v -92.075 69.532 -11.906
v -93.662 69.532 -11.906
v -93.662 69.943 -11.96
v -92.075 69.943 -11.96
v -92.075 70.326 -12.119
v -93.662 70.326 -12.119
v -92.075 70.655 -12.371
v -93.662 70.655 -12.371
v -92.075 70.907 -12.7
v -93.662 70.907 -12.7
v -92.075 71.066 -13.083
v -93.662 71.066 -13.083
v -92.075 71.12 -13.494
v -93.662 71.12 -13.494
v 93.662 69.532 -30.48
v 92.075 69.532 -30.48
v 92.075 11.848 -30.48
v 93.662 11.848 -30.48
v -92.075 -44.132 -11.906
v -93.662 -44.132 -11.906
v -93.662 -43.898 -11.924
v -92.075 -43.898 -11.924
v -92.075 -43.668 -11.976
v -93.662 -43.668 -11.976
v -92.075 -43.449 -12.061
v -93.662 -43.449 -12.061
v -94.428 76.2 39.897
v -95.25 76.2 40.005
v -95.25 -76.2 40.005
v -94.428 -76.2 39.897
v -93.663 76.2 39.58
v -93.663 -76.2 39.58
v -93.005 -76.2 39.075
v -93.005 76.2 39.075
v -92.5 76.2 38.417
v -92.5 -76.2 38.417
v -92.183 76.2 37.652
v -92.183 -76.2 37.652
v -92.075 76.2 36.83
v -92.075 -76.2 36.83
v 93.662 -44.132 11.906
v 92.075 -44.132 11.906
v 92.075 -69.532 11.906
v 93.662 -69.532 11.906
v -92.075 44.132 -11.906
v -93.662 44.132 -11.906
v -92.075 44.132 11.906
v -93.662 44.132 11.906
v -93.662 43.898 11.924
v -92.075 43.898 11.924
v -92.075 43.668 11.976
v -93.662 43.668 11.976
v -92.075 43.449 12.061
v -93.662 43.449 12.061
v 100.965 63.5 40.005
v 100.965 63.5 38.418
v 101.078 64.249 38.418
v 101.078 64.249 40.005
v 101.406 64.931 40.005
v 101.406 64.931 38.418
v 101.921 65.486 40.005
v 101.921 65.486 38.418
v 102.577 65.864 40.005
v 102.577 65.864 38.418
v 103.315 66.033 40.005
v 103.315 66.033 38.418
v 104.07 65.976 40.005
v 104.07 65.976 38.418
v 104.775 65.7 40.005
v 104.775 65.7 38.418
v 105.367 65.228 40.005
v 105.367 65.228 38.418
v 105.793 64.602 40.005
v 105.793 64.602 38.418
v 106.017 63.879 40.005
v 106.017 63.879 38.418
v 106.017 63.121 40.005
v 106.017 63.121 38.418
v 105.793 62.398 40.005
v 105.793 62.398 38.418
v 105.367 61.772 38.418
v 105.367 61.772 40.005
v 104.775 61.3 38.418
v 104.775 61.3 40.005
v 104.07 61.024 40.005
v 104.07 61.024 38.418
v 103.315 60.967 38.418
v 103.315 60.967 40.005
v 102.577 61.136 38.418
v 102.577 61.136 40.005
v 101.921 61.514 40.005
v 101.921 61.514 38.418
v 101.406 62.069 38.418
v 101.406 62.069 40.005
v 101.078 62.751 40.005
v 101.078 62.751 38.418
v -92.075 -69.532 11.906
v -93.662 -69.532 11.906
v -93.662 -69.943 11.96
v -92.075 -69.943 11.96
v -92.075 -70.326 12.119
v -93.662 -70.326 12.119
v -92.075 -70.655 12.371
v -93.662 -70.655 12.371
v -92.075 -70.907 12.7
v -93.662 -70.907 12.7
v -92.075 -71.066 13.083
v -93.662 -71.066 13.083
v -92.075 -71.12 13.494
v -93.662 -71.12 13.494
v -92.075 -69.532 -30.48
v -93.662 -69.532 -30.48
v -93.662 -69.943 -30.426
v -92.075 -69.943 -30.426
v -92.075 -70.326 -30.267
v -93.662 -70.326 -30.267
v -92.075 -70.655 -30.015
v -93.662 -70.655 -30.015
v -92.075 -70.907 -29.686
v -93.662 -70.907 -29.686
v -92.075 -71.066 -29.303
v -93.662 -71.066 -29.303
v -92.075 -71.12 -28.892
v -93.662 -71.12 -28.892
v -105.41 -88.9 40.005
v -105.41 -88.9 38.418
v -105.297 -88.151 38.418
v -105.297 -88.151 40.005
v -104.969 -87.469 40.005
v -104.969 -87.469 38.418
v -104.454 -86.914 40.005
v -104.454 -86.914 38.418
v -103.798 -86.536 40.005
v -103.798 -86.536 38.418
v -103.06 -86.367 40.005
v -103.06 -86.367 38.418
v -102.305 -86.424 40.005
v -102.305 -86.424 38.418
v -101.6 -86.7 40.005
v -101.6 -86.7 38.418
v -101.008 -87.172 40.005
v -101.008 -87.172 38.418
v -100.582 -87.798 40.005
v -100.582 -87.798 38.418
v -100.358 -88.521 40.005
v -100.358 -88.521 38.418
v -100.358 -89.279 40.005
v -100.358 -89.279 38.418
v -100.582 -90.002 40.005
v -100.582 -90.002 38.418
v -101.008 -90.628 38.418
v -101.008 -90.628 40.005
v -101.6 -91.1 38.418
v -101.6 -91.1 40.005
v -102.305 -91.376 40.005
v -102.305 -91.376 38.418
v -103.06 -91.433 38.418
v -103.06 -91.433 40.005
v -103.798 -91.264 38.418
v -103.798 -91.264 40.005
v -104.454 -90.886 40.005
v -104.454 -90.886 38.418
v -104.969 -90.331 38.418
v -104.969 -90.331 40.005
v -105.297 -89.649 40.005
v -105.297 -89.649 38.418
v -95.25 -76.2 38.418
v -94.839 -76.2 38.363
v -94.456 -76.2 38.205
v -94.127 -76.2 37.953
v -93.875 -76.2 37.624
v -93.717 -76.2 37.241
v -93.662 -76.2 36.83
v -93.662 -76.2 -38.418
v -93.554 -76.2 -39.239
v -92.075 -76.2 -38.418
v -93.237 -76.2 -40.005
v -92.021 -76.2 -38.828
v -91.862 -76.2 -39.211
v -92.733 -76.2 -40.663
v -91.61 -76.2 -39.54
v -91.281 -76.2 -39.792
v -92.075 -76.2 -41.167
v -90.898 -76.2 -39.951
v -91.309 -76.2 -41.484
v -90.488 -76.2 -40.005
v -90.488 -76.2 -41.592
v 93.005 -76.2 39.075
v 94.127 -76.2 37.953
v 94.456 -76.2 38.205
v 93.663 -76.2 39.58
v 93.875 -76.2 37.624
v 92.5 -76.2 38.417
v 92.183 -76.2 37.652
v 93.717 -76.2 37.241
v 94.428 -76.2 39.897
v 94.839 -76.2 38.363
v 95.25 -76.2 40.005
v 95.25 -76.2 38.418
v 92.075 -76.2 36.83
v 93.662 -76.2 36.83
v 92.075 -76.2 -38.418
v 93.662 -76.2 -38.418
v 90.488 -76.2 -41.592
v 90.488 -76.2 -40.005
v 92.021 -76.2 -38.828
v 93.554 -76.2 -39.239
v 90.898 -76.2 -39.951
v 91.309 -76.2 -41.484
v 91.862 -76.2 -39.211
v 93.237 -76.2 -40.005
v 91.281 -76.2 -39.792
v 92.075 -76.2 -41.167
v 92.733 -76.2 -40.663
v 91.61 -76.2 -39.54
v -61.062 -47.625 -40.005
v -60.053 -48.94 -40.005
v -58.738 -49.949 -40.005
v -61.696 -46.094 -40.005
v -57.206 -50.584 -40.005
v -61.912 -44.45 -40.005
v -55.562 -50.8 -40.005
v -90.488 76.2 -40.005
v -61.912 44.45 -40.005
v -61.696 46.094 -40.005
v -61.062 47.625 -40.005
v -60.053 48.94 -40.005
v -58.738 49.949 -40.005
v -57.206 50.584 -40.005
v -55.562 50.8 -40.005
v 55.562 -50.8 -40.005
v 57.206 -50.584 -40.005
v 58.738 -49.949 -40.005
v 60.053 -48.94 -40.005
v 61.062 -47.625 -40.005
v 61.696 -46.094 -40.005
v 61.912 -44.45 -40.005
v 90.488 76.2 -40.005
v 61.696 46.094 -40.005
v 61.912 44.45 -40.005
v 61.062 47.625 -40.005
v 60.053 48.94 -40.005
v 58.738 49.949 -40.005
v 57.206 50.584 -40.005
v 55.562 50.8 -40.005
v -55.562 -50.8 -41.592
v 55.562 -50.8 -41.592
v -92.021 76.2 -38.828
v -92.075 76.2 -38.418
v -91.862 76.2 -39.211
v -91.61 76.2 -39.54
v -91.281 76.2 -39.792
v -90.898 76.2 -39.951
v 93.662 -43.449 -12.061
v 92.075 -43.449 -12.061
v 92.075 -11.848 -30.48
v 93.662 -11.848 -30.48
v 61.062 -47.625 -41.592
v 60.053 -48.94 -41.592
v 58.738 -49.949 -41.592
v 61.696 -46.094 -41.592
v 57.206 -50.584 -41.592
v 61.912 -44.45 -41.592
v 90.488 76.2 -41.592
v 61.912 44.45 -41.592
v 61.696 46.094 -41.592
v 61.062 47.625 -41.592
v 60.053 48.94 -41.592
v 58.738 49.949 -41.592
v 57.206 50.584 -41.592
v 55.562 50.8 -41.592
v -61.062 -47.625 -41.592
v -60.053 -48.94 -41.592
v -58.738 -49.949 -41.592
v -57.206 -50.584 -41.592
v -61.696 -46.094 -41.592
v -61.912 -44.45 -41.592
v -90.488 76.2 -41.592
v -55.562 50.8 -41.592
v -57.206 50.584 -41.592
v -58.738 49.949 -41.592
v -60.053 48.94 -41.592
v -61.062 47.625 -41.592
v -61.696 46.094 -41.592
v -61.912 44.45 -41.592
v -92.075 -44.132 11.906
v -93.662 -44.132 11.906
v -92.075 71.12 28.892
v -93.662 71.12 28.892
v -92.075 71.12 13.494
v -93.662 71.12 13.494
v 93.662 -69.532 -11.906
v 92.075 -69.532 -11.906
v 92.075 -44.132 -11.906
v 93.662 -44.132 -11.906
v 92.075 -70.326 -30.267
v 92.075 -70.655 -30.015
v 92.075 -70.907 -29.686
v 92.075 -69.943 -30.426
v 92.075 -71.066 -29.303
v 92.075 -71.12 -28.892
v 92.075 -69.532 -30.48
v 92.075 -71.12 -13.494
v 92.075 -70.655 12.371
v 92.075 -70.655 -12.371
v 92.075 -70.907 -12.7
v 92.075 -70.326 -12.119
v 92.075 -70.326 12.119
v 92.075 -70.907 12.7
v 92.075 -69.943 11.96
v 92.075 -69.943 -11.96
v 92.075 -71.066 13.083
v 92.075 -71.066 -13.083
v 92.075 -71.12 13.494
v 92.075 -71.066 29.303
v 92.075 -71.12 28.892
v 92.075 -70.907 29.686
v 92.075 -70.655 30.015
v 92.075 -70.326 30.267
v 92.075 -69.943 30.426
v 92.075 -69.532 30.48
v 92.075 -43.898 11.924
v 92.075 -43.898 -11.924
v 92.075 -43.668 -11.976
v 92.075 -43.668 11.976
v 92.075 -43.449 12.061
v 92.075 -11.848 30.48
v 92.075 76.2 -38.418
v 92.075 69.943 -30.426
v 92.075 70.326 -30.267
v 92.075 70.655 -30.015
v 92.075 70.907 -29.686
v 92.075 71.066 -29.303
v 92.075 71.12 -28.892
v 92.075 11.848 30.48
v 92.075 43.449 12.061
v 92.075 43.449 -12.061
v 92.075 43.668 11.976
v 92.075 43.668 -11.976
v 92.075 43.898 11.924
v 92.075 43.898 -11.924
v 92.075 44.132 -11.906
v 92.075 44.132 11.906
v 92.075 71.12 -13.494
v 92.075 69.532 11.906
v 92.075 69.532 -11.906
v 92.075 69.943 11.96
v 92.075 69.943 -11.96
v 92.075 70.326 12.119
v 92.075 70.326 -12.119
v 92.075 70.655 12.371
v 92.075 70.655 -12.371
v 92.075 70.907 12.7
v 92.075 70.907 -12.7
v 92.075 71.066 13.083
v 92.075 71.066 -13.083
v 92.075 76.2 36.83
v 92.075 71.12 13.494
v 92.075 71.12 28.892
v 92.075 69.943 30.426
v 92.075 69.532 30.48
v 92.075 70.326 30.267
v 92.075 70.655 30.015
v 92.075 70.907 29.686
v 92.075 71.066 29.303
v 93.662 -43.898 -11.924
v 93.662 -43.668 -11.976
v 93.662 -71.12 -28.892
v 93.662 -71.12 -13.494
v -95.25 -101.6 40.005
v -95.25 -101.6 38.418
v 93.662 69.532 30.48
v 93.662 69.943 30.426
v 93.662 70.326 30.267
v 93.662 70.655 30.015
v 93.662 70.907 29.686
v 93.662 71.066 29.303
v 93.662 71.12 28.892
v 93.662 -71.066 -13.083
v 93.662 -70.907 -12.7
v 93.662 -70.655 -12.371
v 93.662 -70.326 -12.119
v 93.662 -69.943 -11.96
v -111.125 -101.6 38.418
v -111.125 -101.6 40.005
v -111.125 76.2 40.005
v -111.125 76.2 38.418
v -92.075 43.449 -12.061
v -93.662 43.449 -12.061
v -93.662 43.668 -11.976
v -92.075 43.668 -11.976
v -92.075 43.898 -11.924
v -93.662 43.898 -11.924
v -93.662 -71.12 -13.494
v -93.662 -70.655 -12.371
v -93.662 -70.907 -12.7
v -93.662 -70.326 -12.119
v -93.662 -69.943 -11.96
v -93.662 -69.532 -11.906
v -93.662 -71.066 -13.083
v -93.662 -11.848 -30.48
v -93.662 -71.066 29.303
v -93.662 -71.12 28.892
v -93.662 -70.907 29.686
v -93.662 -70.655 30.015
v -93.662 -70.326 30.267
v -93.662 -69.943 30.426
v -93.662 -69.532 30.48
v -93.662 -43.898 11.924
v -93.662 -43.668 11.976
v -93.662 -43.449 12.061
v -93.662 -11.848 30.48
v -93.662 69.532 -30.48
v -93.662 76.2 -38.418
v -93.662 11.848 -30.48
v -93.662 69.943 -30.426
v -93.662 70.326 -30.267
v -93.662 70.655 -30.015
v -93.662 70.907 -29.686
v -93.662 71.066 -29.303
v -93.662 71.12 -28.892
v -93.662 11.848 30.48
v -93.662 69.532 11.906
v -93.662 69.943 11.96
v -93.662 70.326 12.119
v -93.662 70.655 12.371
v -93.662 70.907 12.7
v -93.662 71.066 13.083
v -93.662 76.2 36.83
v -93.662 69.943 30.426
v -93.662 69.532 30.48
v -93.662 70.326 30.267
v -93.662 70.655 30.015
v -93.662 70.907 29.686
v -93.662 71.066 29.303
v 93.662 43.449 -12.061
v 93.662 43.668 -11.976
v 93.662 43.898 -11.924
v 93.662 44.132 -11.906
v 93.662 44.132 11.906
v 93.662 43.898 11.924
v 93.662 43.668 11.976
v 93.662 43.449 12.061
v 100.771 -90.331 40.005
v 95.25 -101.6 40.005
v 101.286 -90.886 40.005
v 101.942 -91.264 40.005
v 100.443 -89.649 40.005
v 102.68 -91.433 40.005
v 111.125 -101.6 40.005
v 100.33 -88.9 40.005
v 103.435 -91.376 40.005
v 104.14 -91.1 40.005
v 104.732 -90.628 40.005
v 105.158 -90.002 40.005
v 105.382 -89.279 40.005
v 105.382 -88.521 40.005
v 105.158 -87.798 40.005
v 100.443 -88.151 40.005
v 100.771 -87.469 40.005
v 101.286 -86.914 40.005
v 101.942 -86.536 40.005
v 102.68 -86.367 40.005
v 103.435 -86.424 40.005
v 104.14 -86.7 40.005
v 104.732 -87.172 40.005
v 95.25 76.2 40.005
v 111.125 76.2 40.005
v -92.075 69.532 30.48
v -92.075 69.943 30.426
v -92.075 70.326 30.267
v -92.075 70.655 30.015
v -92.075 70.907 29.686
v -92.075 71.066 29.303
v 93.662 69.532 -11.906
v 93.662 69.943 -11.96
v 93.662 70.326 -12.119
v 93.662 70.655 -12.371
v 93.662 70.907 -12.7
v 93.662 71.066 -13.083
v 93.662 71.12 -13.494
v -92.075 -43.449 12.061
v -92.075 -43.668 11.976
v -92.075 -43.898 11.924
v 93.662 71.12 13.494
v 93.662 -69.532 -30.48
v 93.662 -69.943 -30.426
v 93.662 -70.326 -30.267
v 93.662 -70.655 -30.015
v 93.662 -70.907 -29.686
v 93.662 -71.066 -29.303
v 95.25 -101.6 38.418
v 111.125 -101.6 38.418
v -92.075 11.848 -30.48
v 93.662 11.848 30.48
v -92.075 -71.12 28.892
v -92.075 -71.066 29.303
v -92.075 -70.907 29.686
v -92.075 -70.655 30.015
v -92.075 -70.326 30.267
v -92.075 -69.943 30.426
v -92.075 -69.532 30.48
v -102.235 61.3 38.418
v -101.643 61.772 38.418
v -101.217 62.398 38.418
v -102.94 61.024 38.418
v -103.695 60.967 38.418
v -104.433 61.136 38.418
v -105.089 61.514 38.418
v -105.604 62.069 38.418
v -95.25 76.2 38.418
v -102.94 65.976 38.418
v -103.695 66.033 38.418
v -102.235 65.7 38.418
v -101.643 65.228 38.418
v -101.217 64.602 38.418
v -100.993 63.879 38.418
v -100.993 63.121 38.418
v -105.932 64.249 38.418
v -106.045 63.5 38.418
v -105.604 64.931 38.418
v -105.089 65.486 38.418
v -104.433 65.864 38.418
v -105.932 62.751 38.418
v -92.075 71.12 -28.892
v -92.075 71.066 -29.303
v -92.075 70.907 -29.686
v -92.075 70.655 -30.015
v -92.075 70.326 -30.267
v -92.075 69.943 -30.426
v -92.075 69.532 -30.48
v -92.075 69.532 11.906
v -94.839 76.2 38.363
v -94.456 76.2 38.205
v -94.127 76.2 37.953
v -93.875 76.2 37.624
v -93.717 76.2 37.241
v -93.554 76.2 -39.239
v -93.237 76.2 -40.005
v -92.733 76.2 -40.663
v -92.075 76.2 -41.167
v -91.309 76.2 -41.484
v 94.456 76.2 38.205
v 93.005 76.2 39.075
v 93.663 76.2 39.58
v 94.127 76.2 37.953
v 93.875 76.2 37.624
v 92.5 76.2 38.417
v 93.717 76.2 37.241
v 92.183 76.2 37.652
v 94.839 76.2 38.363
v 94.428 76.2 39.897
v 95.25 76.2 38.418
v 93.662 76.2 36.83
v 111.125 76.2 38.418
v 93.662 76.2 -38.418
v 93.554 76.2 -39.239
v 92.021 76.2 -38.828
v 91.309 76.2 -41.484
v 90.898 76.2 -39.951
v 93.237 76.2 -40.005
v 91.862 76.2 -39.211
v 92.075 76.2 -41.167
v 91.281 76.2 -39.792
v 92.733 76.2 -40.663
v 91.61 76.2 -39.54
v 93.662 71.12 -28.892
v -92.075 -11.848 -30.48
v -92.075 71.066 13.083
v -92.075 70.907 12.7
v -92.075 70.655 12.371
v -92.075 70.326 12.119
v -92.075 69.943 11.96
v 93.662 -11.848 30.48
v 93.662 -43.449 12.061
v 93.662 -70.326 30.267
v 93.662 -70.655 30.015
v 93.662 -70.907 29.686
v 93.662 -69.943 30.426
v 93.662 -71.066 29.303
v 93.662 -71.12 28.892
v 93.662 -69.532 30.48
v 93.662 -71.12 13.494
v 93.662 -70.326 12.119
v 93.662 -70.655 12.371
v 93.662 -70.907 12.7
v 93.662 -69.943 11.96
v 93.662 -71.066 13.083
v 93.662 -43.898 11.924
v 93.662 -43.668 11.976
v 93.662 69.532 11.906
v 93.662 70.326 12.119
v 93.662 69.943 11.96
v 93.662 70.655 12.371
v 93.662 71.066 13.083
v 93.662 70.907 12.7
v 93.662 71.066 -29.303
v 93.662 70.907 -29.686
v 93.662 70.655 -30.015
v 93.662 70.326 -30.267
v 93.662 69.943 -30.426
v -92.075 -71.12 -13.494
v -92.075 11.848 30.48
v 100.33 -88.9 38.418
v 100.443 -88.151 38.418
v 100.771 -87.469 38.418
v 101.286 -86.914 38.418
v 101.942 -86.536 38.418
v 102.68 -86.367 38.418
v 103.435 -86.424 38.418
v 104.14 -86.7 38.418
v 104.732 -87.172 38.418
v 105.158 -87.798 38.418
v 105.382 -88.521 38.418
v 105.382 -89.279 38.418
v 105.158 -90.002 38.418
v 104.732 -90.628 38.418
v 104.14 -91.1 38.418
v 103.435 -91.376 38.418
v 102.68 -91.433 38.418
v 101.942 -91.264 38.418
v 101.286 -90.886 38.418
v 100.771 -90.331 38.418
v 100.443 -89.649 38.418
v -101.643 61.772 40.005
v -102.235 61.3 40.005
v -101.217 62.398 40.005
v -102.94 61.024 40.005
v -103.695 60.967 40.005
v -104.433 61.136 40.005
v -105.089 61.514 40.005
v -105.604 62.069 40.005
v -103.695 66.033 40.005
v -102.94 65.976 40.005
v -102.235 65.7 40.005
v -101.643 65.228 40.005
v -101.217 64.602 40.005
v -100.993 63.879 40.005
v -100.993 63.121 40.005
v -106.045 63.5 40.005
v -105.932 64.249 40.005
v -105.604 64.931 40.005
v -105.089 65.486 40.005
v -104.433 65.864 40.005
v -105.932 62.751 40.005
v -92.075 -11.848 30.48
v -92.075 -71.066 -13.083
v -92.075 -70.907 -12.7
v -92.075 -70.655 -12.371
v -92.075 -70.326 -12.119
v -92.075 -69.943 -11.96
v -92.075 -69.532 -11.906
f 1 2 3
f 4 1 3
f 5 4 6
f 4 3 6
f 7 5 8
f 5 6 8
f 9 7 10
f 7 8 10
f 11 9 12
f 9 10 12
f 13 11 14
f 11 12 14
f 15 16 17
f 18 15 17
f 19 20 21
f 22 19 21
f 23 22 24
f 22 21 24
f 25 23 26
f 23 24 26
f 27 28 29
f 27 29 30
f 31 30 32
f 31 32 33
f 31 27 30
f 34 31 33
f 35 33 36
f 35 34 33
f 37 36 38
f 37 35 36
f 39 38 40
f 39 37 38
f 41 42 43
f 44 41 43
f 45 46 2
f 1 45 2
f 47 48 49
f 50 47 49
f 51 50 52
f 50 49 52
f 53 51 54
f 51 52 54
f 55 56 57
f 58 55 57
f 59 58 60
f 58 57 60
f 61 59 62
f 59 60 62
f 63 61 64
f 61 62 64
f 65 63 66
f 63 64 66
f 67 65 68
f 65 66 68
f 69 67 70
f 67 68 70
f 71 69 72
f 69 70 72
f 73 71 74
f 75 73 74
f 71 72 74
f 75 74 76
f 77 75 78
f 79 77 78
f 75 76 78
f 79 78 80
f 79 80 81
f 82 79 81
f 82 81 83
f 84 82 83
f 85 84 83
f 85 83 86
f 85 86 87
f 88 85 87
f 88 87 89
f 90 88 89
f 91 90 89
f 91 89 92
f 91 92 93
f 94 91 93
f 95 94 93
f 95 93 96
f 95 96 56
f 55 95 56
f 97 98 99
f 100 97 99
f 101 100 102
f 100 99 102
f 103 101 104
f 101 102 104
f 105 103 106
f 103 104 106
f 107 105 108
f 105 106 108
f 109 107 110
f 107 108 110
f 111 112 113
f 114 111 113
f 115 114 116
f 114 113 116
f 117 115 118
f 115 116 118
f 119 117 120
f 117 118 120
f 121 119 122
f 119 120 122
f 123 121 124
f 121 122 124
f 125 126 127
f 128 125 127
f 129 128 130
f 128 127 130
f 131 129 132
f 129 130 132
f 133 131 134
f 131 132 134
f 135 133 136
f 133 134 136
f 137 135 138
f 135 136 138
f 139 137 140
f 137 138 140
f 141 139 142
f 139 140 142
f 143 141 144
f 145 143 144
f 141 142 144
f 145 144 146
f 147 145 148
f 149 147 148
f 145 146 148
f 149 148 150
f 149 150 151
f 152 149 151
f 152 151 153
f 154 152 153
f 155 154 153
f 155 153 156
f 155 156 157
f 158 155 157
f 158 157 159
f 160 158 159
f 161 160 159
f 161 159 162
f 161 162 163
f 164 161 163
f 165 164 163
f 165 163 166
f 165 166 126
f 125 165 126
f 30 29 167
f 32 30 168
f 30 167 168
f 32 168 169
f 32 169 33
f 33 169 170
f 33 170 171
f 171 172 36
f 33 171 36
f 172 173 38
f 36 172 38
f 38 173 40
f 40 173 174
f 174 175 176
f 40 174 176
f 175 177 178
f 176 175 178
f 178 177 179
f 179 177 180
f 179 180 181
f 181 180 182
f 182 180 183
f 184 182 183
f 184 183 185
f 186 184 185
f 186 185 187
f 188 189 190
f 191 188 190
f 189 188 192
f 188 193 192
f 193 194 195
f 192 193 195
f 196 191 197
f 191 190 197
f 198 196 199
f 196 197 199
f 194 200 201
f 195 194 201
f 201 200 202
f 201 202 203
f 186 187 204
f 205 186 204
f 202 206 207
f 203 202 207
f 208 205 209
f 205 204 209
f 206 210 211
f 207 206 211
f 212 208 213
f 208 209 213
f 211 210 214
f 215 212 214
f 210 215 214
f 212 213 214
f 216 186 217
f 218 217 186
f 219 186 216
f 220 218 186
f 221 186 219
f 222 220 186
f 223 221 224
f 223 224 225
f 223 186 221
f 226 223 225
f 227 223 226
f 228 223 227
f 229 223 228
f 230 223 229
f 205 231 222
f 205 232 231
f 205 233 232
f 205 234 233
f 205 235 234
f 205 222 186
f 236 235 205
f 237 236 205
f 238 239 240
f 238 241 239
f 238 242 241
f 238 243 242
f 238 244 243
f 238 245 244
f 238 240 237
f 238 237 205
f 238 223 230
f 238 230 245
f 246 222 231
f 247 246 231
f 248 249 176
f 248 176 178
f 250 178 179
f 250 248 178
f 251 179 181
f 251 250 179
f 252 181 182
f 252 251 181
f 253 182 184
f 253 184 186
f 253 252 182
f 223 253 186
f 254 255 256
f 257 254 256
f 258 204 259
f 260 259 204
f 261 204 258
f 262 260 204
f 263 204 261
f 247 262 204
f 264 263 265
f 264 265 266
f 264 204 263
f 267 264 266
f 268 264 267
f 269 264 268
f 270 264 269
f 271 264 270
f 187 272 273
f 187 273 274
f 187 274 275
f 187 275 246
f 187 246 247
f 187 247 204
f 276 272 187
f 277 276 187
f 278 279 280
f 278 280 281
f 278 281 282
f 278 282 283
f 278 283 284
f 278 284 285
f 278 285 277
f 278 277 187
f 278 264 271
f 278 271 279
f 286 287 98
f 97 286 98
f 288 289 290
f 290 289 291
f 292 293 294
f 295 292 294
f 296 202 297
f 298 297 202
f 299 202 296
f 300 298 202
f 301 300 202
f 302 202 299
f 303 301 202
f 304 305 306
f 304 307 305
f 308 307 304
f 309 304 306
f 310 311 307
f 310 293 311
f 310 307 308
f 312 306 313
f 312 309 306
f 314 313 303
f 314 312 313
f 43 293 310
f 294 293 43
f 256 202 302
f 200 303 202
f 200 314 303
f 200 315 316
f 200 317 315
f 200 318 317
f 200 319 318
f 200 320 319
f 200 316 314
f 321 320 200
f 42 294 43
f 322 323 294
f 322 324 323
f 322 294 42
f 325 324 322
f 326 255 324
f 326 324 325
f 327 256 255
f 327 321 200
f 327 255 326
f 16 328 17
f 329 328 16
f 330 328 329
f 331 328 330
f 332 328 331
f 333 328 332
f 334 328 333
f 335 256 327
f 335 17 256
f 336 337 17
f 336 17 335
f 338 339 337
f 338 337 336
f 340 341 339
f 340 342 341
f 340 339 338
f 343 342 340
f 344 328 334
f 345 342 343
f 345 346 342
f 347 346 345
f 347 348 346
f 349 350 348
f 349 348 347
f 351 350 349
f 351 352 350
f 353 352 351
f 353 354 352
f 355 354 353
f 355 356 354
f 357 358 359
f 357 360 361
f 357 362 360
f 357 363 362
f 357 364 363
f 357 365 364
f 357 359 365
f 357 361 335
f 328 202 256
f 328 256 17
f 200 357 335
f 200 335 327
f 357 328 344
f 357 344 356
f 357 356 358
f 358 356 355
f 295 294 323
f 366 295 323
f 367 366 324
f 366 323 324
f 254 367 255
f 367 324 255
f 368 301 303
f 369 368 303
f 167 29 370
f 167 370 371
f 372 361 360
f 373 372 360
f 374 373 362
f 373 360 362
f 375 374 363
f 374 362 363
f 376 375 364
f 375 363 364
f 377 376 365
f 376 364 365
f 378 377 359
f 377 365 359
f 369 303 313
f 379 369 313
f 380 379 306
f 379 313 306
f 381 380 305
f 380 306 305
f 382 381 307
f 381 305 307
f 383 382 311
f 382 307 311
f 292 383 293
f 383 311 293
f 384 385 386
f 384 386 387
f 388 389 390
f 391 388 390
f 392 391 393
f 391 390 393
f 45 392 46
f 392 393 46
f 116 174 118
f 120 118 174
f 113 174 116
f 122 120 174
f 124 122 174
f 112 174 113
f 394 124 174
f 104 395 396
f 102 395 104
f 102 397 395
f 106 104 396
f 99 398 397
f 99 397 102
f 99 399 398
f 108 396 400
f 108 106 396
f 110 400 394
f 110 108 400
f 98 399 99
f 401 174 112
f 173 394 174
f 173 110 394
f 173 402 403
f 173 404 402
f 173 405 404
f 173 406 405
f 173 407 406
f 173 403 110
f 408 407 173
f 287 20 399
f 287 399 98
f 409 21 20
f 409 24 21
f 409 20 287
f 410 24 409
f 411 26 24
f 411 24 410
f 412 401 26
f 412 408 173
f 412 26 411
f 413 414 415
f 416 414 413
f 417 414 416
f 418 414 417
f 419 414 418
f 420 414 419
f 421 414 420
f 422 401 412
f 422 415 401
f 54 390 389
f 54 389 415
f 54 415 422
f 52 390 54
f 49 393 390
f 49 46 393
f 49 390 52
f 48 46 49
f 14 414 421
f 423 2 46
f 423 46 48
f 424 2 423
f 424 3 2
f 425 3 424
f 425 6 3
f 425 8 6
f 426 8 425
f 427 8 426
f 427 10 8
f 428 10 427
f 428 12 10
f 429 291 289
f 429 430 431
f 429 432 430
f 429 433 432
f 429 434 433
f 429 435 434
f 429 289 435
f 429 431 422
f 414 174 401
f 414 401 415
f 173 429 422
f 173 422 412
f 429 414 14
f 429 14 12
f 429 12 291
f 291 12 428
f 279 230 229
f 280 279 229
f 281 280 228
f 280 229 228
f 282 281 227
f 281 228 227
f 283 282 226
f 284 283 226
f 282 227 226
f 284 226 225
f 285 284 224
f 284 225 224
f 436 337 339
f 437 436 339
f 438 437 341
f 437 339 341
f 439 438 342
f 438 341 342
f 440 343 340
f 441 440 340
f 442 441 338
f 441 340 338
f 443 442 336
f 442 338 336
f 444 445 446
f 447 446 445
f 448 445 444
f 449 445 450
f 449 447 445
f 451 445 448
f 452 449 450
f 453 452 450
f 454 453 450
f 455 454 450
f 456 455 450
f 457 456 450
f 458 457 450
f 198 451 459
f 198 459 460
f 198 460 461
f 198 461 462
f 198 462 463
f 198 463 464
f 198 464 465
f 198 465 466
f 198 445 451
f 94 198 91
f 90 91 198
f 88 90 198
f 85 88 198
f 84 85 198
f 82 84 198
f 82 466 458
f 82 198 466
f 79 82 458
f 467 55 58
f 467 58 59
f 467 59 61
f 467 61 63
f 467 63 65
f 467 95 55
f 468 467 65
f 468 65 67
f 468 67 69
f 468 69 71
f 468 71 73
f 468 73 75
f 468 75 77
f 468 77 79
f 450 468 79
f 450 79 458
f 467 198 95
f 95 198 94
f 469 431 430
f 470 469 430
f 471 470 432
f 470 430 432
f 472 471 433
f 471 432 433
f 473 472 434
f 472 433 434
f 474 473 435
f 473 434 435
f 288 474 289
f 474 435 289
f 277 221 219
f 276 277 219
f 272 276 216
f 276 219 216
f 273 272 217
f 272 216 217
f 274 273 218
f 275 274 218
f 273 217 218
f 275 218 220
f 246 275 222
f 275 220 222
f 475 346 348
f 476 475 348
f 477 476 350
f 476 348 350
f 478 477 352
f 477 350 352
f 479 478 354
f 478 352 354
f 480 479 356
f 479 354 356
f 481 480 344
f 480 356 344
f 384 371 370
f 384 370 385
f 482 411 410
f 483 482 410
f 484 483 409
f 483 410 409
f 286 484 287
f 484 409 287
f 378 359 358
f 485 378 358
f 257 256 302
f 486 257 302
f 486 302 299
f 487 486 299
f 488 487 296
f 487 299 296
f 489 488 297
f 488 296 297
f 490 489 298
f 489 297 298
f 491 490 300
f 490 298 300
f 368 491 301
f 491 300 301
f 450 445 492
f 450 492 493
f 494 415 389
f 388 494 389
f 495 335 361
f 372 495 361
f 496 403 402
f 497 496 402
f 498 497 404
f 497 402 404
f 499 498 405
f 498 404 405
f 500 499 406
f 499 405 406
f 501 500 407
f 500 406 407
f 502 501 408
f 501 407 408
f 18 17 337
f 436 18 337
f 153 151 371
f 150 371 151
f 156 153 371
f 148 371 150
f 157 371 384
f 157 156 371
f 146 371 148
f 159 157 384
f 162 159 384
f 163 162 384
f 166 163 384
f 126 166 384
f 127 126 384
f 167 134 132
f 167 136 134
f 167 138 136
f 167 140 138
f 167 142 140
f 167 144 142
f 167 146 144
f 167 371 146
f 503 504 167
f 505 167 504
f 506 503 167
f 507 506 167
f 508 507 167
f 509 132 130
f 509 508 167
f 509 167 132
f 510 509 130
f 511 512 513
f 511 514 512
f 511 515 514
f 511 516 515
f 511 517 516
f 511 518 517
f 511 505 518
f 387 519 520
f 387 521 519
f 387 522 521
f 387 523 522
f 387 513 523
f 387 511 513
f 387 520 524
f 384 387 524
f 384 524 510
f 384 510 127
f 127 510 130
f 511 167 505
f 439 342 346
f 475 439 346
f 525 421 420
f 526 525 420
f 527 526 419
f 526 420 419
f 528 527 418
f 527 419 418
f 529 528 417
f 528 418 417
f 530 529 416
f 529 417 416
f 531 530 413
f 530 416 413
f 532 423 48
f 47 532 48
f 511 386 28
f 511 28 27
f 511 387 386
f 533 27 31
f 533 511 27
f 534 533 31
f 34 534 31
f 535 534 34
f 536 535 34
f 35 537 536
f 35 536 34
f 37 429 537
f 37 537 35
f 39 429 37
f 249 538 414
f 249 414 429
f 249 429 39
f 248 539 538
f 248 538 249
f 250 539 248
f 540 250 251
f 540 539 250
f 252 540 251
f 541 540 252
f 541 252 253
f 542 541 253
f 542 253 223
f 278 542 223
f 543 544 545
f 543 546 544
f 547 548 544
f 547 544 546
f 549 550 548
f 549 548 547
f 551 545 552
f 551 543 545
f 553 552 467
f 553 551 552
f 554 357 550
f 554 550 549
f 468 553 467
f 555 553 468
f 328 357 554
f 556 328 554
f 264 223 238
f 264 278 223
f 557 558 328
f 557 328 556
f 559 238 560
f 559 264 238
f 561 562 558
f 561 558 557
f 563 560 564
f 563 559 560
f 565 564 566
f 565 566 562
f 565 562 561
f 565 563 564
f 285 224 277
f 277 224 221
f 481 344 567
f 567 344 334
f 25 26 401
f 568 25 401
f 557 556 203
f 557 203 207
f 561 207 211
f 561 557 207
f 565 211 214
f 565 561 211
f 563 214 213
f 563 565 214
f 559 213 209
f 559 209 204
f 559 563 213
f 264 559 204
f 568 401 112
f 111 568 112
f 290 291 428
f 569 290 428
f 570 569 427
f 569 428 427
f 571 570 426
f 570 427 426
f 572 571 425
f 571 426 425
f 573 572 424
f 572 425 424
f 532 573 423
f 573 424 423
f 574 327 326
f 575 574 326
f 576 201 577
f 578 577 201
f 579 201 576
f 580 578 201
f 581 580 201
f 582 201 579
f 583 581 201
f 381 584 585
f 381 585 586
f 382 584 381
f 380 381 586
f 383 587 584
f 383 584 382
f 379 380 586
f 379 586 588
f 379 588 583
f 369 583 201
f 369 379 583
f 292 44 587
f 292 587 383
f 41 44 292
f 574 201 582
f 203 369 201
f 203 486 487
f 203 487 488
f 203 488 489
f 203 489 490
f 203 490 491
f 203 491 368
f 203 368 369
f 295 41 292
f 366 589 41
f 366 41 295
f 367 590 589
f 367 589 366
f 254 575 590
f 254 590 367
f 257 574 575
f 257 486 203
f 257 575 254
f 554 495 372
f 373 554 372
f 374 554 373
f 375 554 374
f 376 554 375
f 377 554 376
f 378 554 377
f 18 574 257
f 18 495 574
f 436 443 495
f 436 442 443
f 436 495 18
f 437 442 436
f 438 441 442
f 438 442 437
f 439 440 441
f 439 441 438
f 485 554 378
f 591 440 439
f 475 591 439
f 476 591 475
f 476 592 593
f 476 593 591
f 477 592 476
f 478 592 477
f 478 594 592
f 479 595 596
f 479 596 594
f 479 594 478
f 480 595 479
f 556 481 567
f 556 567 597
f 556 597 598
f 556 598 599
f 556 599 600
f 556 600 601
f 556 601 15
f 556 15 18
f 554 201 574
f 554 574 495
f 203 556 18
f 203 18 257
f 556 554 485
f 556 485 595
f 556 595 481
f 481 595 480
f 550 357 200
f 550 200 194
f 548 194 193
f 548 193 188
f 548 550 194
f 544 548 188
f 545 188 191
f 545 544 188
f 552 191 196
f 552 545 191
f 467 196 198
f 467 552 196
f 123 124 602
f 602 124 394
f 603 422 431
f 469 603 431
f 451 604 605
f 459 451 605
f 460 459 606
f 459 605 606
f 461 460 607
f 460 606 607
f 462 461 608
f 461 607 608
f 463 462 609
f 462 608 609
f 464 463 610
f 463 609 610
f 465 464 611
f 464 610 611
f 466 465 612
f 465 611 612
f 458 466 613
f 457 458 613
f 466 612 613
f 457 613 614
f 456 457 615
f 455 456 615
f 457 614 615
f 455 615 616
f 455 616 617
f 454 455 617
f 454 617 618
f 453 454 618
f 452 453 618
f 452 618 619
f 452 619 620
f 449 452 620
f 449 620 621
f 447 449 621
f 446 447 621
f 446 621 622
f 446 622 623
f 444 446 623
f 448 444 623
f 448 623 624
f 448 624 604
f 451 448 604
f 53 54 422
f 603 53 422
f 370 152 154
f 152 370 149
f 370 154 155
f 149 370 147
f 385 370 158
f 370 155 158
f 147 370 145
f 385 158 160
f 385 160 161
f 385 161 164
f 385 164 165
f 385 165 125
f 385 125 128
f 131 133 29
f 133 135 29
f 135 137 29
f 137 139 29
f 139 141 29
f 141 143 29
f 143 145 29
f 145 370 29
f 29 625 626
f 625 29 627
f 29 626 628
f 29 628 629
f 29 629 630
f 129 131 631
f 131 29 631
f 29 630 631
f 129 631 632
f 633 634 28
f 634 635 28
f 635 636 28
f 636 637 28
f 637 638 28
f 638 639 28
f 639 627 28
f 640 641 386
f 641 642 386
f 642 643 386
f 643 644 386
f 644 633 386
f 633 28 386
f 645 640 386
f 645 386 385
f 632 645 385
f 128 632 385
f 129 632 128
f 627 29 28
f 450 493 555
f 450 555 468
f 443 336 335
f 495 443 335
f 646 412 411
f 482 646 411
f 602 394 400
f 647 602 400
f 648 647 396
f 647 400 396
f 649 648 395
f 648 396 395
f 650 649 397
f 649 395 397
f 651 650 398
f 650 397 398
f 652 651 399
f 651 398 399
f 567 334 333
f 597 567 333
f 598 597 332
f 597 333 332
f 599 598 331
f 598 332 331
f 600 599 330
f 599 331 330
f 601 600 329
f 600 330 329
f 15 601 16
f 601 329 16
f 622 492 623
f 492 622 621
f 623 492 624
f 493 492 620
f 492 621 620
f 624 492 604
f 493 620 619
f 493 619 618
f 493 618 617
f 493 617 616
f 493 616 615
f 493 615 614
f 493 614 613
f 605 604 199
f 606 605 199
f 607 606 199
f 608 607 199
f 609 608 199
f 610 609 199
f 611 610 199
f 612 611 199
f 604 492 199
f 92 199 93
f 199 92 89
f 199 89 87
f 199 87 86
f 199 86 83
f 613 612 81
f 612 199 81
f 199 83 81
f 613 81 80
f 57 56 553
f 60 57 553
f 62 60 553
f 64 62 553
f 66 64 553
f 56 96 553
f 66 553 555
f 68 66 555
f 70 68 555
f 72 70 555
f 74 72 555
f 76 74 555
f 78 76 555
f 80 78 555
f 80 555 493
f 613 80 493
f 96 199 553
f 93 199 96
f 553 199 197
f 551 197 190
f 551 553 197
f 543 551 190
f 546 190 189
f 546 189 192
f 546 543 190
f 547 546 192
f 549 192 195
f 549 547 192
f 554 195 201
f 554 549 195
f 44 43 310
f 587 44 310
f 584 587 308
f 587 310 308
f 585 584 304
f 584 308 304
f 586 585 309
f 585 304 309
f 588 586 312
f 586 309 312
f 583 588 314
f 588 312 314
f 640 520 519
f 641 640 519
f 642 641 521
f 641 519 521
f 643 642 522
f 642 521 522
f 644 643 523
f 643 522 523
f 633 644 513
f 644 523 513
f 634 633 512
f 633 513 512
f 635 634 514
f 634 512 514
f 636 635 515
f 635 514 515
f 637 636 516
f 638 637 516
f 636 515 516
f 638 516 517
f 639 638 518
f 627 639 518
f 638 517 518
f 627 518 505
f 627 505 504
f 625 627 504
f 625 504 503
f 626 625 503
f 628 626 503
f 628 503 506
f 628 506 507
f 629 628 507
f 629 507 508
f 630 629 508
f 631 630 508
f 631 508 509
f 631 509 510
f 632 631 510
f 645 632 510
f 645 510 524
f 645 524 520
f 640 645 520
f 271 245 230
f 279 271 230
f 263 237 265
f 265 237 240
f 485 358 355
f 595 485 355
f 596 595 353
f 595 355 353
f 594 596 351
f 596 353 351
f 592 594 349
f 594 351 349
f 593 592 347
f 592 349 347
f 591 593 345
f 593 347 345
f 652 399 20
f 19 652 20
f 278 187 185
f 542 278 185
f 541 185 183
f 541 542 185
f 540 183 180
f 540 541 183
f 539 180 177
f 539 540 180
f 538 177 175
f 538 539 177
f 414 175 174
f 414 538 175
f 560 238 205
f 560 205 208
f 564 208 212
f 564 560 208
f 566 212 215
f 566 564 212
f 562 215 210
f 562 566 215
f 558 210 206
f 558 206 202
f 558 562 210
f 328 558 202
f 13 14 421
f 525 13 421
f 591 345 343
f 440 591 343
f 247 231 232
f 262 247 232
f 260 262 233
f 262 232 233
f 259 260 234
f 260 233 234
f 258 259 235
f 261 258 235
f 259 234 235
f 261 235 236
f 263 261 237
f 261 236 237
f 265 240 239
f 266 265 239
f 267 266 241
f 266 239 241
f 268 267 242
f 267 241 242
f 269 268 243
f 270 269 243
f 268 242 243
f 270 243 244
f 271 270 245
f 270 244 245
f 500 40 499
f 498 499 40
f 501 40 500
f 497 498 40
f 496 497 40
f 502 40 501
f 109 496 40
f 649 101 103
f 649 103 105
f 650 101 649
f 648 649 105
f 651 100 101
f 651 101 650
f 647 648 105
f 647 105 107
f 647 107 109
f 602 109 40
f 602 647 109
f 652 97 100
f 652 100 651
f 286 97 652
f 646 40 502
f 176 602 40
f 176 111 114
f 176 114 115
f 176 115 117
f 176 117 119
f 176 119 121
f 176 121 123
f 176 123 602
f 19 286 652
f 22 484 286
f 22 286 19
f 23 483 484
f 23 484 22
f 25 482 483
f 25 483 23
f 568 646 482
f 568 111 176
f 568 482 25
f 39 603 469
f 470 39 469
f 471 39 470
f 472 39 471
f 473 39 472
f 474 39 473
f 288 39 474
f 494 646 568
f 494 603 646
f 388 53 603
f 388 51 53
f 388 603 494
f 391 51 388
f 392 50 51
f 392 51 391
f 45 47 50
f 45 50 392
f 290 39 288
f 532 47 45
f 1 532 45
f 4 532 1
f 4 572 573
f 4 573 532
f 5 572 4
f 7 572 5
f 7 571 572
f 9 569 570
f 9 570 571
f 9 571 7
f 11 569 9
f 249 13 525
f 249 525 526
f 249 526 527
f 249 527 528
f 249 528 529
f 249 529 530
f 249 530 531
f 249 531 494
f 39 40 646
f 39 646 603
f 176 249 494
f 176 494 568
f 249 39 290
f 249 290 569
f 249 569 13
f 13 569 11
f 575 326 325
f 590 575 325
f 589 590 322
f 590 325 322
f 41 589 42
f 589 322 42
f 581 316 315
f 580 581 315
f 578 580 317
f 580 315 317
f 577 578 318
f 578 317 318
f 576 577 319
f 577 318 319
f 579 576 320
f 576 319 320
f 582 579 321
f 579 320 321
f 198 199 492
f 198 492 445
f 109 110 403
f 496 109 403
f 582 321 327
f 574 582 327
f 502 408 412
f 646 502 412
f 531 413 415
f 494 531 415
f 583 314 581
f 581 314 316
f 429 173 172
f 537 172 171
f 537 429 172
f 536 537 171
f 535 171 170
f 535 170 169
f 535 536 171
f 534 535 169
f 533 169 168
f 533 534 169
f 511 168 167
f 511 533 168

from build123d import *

# Parameters (mm, degrees)
BASE_FLANGE1_DEPTH  = 76.2
CUT_EXTRUDE1_DEPTH  = 1.5875
CUT_EXTRUDE4_DEPTH  = 223.428182145
SKETCH11_W          = 15.875
SKETCH11_H          = 1.5875
BOSS_EXTRUDE1_DEPTH = 25.4
SKETCH12_W          = 15.875
SKETCH12_H          = 1.5875
BOSS_EXTRUDE2_DEPTH = 25.4
SKETCH13_R          = 2.54
CUT_EXTRUDE5_DEPTH  = 25.4
SKETCH14_R          = 2.54
CUT_EXTRUDE6_DEPTH  = 25.4
SKETCH15_R          = 2.54
CUT_EXTRUDE7_DEPTH  = 25.4


# Sheet-metal steps are written as plain solids
with BuildPart() as part:
    # Sketch1 → Base-Flange1 (new, symmetric)
    with BuildSketch(Plane(origin=(0, 0, 0), x_dir=(1, 0, 0), z_dir=(0, 1, 0))):
        with BuildLine():
            Line((-111.125, -40.005), (-95.25, -40.005))
            ThreePointArc((-95.25, -40.005), (-93.00493597, -39.07506403), (-92.075, -36.83))
            Line((-92.075, -36.83), (-92.075, 38.4175))
            ThreePointArc((-92.075, 38.4175), (-91.610032015, 39.540032015), (-90.4875, 40.005))
            Line((-90.4875, 40.005), (90.4875, 40.005))
            ThreePointArc((90.4875, 40.005), (91.610032015, 39.540032015), (92.075, 38.4175))
            Line((92.075, 38.4175), (92.075, -36.83))
            ThreePointArc((92.075, -36.83), (93.00493597, -39.07506403), (95.25, -40.005))
            Line((95.25, -40.005), (111.125, -40.005))
            Line((111.125, -40.005), (111.125, -38.4175))
            Line((111.125, -38.4175), (95.25, -38.4175))
            ThreePointArc((95.25, -38.4175), (94.127467985, -37.952532015), (93.6625, -36.83))
            Line((93.6625, -36.83), (93.6625, 38.4175))
            ThreePointArc((93.6625, 38.4175), (92.73256403, 40.66256403), (90.4875, 41.5925))
            Line((90.4875, 41.5925), (-90.4875, 41.5925))
            ThreePointArc((-90.4875, 41.5925), (-92.73256403, 40.66256403), (-93.6625, 38.4175))
            Line((-93.6625, 38.4175), (-93.6625, -36.83))
            ThreePointArc((-93.6625, -36.83), (-94.127467985, -37.952532015), (-95.25, -38.4175))
            Line((-95.25, -38.4175), (-111.125, -38.4175))
            Line((-111.125, -38.4175), (-111.125, -40.005))
        make_face()
    extrude(amount=BASE_FLANGE1_DEPTH, both=True)

    # Sketch6 → Cut-Extrude1 (cut)
    with BuildSketch(Plane.XY.offset(-40.005)):
        with BuildLine():
            Line((-55.5625, -50.8), (55.5625, -50.8))
            ThreePointArc((55.5625, -50.8), (60.052628061, -48.940128061), (61.9125, -44.45))
            Line((61.9125, -44.45), (61.9125, 44.45))
            ThreePointArc((61.9125, 44.45), (60.052628061, 48.940128061), (55.5625, 50.8))
            Line((55.5625, 50.8), (-55.5625, 50.8))
            ThreePointArc((-55.5625, 50.8), (-60.052628061, 48.940128061), (-61.9125, 44.45))
            Line((-61.9125, 44.45), (-61.9125, -44.45))
            ThreePointArc((-61.9125, -44.45), (-60.052628061, -48.940128061), (-55.5625, -50.8))
        make_face()
    extrude(amount=-CUT_EXTRUDE1_DEPTH, mode=Mode.SUBTRACT)

    # Sketch10 → Cut-Extrude4 (cut, through all)
    with BuildSketch(Plane.ZY.offset(93.6625)):
        with BuildLine():
            Line((12.060895861, 43.449063634), (30.48, 11.848349253))
            Line((30.48, 11.848349253), (30.48, 69.5325))
            ThreePointArc((30.48, 69.5325), (30.015032015, 70.655032015), (28.8925, 71.12))
            Line((28.8925, 71.12), (13.49375, 71.12))
            ThreePointArc((13.49375, 71.12), (12.371217985, 70.655032015), (11.90625, 69.5325))
            Line((11.90625, 69.5325), (11.90625, 44.1325))
            ThreePointArc((11.90625, 44.1325), (11.945394066, 43.782142822), (12.060895861, 43.449063634))
        make_face()
        with BuildLine():
            Line((-13.49375, 71.12), (-28.8925, 71.12))
            ThreePointArc((-28.8925, 71.12), (-30.015032015, 70.655032015), (-30.48, 69.5325))
            Line((-30.48, 69.5325), (-30.48, 11.848349253))
            Line((-30.48, 11.848349253), (-12.060895861, 43.449063634))
            ThreePointArc((-12.060895861, 43.449063634), (-11.945394066, 43.782142822), (-11.90625, 44.1325))
            Line((-11.90625, 44.1325), (-11.90625, 69.5325))
            ThreePointArc((-11.90625, 69.5325), (-12.371217985, 70.655032015), (-13.49375, 71.12))
        make_face()
        with BuildLine():
            Line((30.48, -69.5325), (30.48, -11.848349253))
            Line((30.48, -11.848349253), (12.060895861, -43.449063634))
            ThreePointArc((12.060895861, -43.449063634), (11.945394066, -43.782142822), (11.90625, -44.1325))
            Line((11.90625, -44.1325), (11.90625, -69.5325))
            ThreePointArc((11.90625, -69.5325), (12.371217985, -70.655032015), (13.49375, -71.12))
            Line((13.49375, -71.12), (28.8925, -71.12))
            ThreePointArc((28.8925, -71.12), (30.015032015, -70.655032015), (30.48, -69.5325))
        make_face()
        with BuildLine():
            Line((-12.060895861, -43.449063634), (-30.48, -11.848349253))
            Line((-30.48, -11.848349253), (-30.48, -69.5325))
            ThreePointArc((-30.48, -69.5325), (-30.015032015, -70.655032015), (-28.8925, -71.12))
            Line((-28.8925, -71.12), (-13.49375, -71.12))
            ThreePointArc((-13.49375, -71.12), (-12.371217985, -70.655032015), (-11.90625, -69.5325))
            Line((-11.90625, -69.5325), (-11.90625, -44.1325))
            ThreePointArc((-11.90625, -44.1325), (-11.945394066, -43.782142822), (-12.060895861, -43.449063634))
        make_face()
    extrude(amount=-CUT_EXTRUDE4_DEPTH, mode=Mode.SUBTRACT)

    # Sketch11 → Boss-Extrude1 (add)
    with BuildSketch(Plane.XZ.offset(76.2)):
        with Locations((103.1875, 39.21125)):
            Rectangle(SKETCH11_W, SKETCH11_H)
    extrude(amount=BOSS_EXTRUDE1_DEPTH)

    # Sketch12 → Boss-Extrude2 (add)
    with BuildSketch(Plane(origin=(0, -76.2, 0), x_dir=(-1, 0, 0), z_dir=(0, -1, 0))):
        with Locations((103.1875, -39.21125)):
            Rectangle(SKETCH12_W, SKETCH12_H)
    extrude(amount=BOSS_EXTRUDE2_DEPTH)

    # Sketch13 → Cut-Extrude5 (cut)
    with BuildSketch(Plane(origin=(0, 0, 38.4175), x_dir=(-1, 0, 0), z_dir=(0, 0, -1))):
        with Locations((-102.87, -88.9)):
            Circle(SKETCH13_R)
        with Locations((-103.505, 63.5)):
            Circle(SKETCH13_R)
    extrude(amount=-CUT_EXTRUDE5_DEPTH, mode=Mode.SUBTRACT)

    # Sketch14 → Cut-Extrude6 (cut)
    with BuildSketch(Plane(origin=(0, 0, 38.4175), x_dir=(-1, 0, 0), z_dir=(0, 0, -1))):
        with Locations((103.505, 63.5)):
            Circle(SKETCH14_R)
    extrude(amount=-CUT_EXTRUDE6_DEPTH, mode=Mode.SUBTRACT)

    # Sketch15 → Cut-Extrude7 (cut)
    with BuildSketch(Plane(origin=(0, 0, 38.4175), x_dir=(-1, 0, 0), z_dir=(0, 0, -1))):
        with Locations((102.87, -88.9)):
            Circle(SKETCH15_R)
    extrude(amount=-CUT_EXTRUDE7_DEPTH, mode=Mode.SUBTRACT)


solid = part.part
